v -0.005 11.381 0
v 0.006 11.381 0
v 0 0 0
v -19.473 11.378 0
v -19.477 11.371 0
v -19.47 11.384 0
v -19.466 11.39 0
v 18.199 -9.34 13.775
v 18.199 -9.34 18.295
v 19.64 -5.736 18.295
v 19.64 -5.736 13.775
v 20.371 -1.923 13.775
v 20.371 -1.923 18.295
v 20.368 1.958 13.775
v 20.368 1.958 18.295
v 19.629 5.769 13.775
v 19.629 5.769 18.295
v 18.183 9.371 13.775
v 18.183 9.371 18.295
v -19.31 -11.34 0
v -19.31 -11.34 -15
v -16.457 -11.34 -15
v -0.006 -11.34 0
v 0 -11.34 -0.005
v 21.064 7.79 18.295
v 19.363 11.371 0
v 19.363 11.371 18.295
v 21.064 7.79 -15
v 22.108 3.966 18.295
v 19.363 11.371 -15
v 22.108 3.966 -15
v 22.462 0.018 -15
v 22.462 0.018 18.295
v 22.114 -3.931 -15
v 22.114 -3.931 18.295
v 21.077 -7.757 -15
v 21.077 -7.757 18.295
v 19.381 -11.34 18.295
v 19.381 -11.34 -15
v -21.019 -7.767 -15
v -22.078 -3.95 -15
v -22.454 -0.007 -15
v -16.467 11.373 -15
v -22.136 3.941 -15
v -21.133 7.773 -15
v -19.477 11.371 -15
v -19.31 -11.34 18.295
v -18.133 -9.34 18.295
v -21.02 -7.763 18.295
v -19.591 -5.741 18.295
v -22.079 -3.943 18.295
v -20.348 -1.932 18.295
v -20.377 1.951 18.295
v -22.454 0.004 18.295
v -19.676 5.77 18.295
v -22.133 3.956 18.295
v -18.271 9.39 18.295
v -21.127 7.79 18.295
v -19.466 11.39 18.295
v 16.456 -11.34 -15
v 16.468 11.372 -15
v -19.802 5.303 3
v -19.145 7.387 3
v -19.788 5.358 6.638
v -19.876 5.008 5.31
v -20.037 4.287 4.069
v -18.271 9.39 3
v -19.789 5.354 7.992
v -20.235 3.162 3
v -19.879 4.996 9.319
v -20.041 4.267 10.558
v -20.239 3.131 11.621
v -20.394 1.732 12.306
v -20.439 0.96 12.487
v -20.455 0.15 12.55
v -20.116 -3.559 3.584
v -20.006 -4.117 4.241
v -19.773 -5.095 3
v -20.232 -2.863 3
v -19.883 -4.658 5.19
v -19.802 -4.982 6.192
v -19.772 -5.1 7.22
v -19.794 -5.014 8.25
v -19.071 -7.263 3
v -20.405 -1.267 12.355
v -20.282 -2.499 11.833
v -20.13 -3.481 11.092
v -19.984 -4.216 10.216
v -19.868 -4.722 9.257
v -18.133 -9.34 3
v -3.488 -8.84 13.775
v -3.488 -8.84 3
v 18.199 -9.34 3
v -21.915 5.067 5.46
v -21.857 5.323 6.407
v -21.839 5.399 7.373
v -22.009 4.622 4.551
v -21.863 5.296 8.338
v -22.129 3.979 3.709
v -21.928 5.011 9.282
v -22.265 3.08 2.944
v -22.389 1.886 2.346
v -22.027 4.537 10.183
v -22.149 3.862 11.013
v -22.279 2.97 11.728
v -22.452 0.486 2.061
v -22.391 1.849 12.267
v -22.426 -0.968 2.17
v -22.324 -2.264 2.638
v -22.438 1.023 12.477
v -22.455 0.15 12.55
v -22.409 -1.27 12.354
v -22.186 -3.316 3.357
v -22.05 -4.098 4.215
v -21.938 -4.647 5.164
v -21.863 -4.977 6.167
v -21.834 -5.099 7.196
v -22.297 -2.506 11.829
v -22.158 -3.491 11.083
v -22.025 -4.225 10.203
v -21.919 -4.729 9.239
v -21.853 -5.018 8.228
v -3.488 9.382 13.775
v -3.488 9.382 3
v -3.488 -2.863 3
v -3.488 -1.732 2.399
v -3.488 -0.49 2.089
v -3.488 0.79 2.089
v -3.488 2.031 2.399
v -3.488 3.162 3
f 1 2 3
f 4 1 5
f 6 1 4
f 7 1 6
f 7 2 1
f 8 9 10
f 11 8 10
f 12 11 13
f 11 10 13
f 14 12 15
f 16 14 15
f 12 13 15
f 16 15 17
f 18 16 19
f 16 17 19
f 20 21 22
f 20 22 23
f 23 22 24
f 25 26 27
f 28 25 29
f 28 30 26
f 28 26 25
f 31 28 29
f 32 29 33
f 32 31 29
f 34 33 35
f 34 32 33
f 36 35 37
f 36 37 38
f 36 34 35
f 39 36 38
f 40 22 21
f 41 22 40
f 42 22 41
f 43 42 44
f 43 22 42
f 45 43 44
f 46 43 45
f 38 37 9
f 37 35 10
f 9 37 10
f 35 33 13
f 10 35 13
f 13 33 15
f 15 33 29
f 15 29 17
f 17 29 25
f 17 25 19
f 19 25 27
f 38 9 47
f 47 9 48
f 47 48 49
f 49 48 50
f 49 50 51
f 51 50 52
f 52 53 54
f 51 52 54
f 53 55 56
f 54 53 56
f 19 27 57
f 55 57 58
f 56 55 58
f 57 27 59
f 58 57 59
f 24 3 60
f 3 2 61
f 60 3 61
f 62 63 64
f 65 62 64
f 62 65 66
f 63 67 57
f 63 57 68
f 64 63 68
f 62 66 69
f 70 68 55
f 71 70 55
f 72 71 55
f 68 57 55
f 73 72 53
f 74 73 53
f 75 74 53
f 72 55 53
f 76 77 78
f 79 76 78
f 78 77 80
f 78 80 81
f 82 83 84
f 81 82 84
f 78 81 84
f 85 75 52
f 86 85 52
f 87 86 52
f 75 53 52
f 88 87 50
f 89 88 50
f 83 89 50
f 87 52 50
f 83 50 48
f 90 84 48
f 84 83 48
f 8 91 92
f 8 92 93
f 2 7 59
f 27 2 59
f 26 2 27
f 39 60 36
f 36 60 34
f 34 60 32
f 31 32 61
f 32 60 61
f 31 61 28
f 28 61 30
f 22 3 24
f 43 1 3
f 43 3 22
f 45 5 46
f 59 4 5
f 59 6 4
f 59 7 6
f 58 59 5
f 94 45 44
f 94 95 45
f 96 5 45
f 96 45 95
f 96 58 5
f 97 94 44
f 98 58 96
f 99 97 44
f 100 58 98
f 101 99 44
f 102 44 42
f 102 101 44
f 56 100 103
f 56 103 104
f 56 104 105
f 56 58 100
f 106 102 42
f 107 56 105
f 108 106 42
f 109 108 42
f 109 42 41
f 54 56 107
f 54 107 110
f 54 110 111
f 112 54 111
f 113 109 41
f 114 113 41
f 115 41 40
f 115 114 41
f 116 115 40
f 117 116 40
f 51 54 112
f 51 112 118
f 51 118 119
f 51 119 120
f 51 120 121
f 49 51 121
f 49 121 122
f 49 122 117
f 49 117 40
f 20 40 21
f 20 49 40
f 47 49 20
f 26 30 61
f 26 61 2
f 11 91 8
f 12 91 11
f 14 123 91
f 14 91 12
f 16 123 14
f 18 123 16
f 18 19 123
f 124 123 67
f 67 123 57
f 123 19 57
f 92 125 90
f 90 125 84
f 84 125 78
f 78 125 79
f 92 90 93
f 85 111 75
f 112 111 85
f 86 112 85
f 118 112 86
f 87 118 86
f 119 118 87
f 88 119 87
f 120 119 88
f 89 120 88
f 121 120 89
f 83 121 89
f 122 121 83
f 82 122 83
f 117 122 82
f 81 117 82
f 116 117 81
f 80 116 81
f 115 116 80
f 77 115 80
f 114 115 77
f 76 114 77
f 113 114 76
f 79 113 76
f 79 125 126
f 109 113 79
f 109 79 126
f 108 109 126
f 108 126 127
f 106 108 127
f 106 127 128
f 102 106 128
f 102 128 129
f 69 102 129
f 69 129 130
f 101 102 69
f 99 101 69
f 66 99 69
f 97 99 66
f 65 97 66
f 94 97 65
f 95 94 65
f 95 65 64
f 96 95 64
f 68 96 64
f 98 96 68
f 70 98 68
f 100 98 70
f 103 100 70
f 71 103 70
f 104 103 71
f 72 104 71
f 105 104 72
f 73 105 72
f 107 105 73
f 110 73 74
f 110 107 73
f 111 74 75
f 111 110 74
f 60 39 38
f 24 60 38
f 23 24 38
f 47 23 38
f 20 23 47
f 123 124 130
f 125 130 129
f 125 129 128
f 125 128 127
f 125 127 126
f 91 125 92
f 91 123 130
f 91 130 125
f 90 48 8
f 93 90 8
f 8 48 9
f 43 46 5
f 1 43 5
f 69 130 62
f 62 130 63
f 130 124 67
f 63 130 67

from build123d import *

# Parameters (mm, degrees)
BOSS_EXTRUDE1_DEPTH = 15.295
CUT_EXTRUDE1_DEPTH  = 206.919868261
FLOOR_START         = 3
FLOOR_2_DEPTH       = 3
BOSS_EXTRUDE4_START = 10.775
BOSS_EXTRUDE4_DEPTH = 10.775
BOSS_EXTRUDE5_REACH = 176.665
CUT_EXTRUDE3_REACH  = 209.578
SKETCH7_R           = 5.25
SKETCH14_OUTSIDE_W  = 59.009
SKETCH14_OUTSIDE_H  = 36.805
CUT_EXTRUDE4_DEPTH  = 33.295


with BuildPart() as part:
    # Sketch1 → Boss-Extrude1 (new body)
    with BuildSketch(Plane(origin=(0, 0, -12.295), x_dir=(-1, 0, 0), z_dir=(0, 0, -1))):
        with BuildLine():
            Line((-169.369133898, -111.490025098), (-130.678433581, -111.48937301))
            ThreePointArc((-130.678433581, -111.48937301), (-127.534095849, -100.145401406), (-130.522109497, -88.759255177))
            Line((-130.522109497, -88.759255177), (-169.350721063, -88.778648203))
            ThreePointArc((-169.350721063, -88.778648203), (-172.450070697, -100.131831373), (-169.369133898, -111.490025098))
        make_face()
    extrude(amount=-BOSS_EXTRUDE1_DEPTH)

    # Sketch2 → Cut-Extrude1 (cut, through all)
    with BuildSketch(Plane.XY.offset(3)):
        with BuildLine():
            Line((168.171133654, -90.778059306), (131.717568579, -90.759852501))
            ThreePointArc((131.717568579, -90.759852501), (129.534116109, -100.141151153), (131.855022492, -109.48939284))
            Line((131.855022492, -109.48939284), (168.187605365, -109.490005184))
            ThreePointArc((168.187605365, -109.490005184), (170.450070154, -100.132033398), (168.171133654, -90.778059306))
        make_face()
    extrude(amount=-CUT_EXTRUDE1_DEPTH, mode=Mode.SUBTRACT)

    # Sketch4 → floor 2 (add)
    with BuildSketch(Plane(origin=(0, 0, -12.295), x_dir=(-1, 0, 0), z_dir=(0, 0, -1)).offset(FLOOR_START)):
        with BuildLine():
            Line((-169.369133898, -111.490025098), (-130.678433581, -111.48937301))
            ThreePointArc((-130.678433581, -111.48937301), (-127.534095849, -100.145401406), (-130.522109497, -88.759255177))
            Line((-130.522109497, -88.759255177), (-169.350721063, -88.778648203))
            ThreePointArc((-169.350721063, -88.778648203), (-172.450070697, -100.131831373), (-169.369133898, -111.490025098))
        make_face()
    extrude(amount=-FLOOR_2_DEPTH)

    # Sketch6 → Boss-Extrude4 (add)
    with BuildSketch(Plane.XY.offset(-12.295).offset(BOSS_EXTRUDE4_START)):
        with BuildLine():
            Line((146.5, -90.767235615), (146.5, -108.989639664))
            Line((146.5, -108.989639664), (168.187605365, -109.490005184))
            ThreePointArc((168.187605365, -109.490005184), (170.450070154, -100.132033398), (168.171133654, -90.778059306))
            Line((168.171133654, -90.778059306), (146.5, -90.767235615))
        make_face()
    extrude(amount=-BOSS_EXTRUDE4_DEPTH)

    # Boss-Extrude5: up to this face of the body (flat: up to its plane)
    boss_extrude5_end = Plane(part.part.faces().sort_by_distance((150.023783739, -111.489699054, -6.1475))[0])
    # Sketch11 → Boss-Extrude5 (add, up to the picked face)
    with BuildSketch(Plane(origin=(-0.044298414, -88.694043528, 0), x_dir=(0.9999998752738909, -0.0004994519023308322, 0), z_dir=(0.0004994519023308322, 0.9999998752738909, 0)), mode=Mode.PRIVATE) as boss_extrude5_sk1:
        Polygon((150.03815576, 15.295), (166.500079456, 30.295), (172.500079456, 30.295), (172.500079456, 15.295), align=None)
    boss_extrude5_tool1 = split(extrude(boss_extrude5_sk1.sketch, amount=-BOSS_EXTRUDE5_REACH, mode=Mode.PRIVATE), bisect_by=boss_extrude5_end, keep=Keep.BOTH, mode=Mode.PRIVATE)
    boss_extrude5 = boss_extrude5_tool1.solids().sort_by(Axis((164.546837, -88.776249, -21.34904), (-0.0004994519023308322, -0.9999998752738909, 0)))[0]
    add(boss_extrude5)

    # Cut-Extrude3: up to this face of the body (flat: up to its plane)
    cut_extrude3_end = Plane(part.part.faces().sort_by_distance((146.5, -99.87843764, -6.9075))[0])
    # Sketch7 → Cut-Extrude3 (cut, up to the picked face)
    with BuildSketch(Plane(origin=(0, 0, 0), x_dir=(0, 0, -1), z_dir=(1, 0, 0)), mode=Mode.PRIVATE) as cut_extrude3_sk1:
        with Locations(Location((7.995, -100, 0), (0, 0, 180))):
            Circle(SKETCH7_R)
    cut_extrude3_tool1 = split(extrude(cut_extrude3_sk1.sketch, amount=CUT_EXTRUDE3_REACH, mode=Mode.PRIVATE), bisect_by=cut_extrude3_end, keep=Keep.BOTH, mode=Mode.PRIVATE)
    add(cut_extrude3_tool1.solids().sort_by(Axis((0, -100, -7.995), (1, 0, 0)))[0], mode=Mode.SUBTRACT)

    # Mirror1: Boss-Extrude5 across plane
    add(boss_extrude5.mirror(Plane(origin=(149.98984246, -0.002527909, 0), x_dir=(0, 0, 1), z_dir=(-0.9999999998579736, 1.6853871084051315e-05, 0))))

    # Sketch14 outside → Cut-Extrude4 (cut)
    with BuildSketch(Plane.XY.offset(3)):
        with Locations((149.9885, -100.1245)):
            Rectangle(SKETCH14_OUTSIDE_W, SKETCH14_OUTSIDE_H)
        with BuildLine():
            Line((169.350721063, -88.778648203), (130.522109497, -88.759255177))
            ThreePointArc((130.522109497, -88.759255177), (127.534095849, -100.145401406), (130.678433581, -111.48937301))
            Line((130.678433581, -111.48937301), (169.369133898, -111.490025098))
            ThreePointArc((169.369133898, -111.490025098), (172.450070697, -100.131831373), (169.350721063, -88.778648203))
        make_face(mode=Mode.SUBTRACT)
    extrude(amount=-CUT_EXTRUDE4_DEPTH, mode=Mode.SUBTRACT)


with BuildPart() as part_1:
    # Body-Move/Copy1: moved
    add(part.part.moved(Location((-149.988154595, 100.149527643, 15.295))))


solid = part_1.part
